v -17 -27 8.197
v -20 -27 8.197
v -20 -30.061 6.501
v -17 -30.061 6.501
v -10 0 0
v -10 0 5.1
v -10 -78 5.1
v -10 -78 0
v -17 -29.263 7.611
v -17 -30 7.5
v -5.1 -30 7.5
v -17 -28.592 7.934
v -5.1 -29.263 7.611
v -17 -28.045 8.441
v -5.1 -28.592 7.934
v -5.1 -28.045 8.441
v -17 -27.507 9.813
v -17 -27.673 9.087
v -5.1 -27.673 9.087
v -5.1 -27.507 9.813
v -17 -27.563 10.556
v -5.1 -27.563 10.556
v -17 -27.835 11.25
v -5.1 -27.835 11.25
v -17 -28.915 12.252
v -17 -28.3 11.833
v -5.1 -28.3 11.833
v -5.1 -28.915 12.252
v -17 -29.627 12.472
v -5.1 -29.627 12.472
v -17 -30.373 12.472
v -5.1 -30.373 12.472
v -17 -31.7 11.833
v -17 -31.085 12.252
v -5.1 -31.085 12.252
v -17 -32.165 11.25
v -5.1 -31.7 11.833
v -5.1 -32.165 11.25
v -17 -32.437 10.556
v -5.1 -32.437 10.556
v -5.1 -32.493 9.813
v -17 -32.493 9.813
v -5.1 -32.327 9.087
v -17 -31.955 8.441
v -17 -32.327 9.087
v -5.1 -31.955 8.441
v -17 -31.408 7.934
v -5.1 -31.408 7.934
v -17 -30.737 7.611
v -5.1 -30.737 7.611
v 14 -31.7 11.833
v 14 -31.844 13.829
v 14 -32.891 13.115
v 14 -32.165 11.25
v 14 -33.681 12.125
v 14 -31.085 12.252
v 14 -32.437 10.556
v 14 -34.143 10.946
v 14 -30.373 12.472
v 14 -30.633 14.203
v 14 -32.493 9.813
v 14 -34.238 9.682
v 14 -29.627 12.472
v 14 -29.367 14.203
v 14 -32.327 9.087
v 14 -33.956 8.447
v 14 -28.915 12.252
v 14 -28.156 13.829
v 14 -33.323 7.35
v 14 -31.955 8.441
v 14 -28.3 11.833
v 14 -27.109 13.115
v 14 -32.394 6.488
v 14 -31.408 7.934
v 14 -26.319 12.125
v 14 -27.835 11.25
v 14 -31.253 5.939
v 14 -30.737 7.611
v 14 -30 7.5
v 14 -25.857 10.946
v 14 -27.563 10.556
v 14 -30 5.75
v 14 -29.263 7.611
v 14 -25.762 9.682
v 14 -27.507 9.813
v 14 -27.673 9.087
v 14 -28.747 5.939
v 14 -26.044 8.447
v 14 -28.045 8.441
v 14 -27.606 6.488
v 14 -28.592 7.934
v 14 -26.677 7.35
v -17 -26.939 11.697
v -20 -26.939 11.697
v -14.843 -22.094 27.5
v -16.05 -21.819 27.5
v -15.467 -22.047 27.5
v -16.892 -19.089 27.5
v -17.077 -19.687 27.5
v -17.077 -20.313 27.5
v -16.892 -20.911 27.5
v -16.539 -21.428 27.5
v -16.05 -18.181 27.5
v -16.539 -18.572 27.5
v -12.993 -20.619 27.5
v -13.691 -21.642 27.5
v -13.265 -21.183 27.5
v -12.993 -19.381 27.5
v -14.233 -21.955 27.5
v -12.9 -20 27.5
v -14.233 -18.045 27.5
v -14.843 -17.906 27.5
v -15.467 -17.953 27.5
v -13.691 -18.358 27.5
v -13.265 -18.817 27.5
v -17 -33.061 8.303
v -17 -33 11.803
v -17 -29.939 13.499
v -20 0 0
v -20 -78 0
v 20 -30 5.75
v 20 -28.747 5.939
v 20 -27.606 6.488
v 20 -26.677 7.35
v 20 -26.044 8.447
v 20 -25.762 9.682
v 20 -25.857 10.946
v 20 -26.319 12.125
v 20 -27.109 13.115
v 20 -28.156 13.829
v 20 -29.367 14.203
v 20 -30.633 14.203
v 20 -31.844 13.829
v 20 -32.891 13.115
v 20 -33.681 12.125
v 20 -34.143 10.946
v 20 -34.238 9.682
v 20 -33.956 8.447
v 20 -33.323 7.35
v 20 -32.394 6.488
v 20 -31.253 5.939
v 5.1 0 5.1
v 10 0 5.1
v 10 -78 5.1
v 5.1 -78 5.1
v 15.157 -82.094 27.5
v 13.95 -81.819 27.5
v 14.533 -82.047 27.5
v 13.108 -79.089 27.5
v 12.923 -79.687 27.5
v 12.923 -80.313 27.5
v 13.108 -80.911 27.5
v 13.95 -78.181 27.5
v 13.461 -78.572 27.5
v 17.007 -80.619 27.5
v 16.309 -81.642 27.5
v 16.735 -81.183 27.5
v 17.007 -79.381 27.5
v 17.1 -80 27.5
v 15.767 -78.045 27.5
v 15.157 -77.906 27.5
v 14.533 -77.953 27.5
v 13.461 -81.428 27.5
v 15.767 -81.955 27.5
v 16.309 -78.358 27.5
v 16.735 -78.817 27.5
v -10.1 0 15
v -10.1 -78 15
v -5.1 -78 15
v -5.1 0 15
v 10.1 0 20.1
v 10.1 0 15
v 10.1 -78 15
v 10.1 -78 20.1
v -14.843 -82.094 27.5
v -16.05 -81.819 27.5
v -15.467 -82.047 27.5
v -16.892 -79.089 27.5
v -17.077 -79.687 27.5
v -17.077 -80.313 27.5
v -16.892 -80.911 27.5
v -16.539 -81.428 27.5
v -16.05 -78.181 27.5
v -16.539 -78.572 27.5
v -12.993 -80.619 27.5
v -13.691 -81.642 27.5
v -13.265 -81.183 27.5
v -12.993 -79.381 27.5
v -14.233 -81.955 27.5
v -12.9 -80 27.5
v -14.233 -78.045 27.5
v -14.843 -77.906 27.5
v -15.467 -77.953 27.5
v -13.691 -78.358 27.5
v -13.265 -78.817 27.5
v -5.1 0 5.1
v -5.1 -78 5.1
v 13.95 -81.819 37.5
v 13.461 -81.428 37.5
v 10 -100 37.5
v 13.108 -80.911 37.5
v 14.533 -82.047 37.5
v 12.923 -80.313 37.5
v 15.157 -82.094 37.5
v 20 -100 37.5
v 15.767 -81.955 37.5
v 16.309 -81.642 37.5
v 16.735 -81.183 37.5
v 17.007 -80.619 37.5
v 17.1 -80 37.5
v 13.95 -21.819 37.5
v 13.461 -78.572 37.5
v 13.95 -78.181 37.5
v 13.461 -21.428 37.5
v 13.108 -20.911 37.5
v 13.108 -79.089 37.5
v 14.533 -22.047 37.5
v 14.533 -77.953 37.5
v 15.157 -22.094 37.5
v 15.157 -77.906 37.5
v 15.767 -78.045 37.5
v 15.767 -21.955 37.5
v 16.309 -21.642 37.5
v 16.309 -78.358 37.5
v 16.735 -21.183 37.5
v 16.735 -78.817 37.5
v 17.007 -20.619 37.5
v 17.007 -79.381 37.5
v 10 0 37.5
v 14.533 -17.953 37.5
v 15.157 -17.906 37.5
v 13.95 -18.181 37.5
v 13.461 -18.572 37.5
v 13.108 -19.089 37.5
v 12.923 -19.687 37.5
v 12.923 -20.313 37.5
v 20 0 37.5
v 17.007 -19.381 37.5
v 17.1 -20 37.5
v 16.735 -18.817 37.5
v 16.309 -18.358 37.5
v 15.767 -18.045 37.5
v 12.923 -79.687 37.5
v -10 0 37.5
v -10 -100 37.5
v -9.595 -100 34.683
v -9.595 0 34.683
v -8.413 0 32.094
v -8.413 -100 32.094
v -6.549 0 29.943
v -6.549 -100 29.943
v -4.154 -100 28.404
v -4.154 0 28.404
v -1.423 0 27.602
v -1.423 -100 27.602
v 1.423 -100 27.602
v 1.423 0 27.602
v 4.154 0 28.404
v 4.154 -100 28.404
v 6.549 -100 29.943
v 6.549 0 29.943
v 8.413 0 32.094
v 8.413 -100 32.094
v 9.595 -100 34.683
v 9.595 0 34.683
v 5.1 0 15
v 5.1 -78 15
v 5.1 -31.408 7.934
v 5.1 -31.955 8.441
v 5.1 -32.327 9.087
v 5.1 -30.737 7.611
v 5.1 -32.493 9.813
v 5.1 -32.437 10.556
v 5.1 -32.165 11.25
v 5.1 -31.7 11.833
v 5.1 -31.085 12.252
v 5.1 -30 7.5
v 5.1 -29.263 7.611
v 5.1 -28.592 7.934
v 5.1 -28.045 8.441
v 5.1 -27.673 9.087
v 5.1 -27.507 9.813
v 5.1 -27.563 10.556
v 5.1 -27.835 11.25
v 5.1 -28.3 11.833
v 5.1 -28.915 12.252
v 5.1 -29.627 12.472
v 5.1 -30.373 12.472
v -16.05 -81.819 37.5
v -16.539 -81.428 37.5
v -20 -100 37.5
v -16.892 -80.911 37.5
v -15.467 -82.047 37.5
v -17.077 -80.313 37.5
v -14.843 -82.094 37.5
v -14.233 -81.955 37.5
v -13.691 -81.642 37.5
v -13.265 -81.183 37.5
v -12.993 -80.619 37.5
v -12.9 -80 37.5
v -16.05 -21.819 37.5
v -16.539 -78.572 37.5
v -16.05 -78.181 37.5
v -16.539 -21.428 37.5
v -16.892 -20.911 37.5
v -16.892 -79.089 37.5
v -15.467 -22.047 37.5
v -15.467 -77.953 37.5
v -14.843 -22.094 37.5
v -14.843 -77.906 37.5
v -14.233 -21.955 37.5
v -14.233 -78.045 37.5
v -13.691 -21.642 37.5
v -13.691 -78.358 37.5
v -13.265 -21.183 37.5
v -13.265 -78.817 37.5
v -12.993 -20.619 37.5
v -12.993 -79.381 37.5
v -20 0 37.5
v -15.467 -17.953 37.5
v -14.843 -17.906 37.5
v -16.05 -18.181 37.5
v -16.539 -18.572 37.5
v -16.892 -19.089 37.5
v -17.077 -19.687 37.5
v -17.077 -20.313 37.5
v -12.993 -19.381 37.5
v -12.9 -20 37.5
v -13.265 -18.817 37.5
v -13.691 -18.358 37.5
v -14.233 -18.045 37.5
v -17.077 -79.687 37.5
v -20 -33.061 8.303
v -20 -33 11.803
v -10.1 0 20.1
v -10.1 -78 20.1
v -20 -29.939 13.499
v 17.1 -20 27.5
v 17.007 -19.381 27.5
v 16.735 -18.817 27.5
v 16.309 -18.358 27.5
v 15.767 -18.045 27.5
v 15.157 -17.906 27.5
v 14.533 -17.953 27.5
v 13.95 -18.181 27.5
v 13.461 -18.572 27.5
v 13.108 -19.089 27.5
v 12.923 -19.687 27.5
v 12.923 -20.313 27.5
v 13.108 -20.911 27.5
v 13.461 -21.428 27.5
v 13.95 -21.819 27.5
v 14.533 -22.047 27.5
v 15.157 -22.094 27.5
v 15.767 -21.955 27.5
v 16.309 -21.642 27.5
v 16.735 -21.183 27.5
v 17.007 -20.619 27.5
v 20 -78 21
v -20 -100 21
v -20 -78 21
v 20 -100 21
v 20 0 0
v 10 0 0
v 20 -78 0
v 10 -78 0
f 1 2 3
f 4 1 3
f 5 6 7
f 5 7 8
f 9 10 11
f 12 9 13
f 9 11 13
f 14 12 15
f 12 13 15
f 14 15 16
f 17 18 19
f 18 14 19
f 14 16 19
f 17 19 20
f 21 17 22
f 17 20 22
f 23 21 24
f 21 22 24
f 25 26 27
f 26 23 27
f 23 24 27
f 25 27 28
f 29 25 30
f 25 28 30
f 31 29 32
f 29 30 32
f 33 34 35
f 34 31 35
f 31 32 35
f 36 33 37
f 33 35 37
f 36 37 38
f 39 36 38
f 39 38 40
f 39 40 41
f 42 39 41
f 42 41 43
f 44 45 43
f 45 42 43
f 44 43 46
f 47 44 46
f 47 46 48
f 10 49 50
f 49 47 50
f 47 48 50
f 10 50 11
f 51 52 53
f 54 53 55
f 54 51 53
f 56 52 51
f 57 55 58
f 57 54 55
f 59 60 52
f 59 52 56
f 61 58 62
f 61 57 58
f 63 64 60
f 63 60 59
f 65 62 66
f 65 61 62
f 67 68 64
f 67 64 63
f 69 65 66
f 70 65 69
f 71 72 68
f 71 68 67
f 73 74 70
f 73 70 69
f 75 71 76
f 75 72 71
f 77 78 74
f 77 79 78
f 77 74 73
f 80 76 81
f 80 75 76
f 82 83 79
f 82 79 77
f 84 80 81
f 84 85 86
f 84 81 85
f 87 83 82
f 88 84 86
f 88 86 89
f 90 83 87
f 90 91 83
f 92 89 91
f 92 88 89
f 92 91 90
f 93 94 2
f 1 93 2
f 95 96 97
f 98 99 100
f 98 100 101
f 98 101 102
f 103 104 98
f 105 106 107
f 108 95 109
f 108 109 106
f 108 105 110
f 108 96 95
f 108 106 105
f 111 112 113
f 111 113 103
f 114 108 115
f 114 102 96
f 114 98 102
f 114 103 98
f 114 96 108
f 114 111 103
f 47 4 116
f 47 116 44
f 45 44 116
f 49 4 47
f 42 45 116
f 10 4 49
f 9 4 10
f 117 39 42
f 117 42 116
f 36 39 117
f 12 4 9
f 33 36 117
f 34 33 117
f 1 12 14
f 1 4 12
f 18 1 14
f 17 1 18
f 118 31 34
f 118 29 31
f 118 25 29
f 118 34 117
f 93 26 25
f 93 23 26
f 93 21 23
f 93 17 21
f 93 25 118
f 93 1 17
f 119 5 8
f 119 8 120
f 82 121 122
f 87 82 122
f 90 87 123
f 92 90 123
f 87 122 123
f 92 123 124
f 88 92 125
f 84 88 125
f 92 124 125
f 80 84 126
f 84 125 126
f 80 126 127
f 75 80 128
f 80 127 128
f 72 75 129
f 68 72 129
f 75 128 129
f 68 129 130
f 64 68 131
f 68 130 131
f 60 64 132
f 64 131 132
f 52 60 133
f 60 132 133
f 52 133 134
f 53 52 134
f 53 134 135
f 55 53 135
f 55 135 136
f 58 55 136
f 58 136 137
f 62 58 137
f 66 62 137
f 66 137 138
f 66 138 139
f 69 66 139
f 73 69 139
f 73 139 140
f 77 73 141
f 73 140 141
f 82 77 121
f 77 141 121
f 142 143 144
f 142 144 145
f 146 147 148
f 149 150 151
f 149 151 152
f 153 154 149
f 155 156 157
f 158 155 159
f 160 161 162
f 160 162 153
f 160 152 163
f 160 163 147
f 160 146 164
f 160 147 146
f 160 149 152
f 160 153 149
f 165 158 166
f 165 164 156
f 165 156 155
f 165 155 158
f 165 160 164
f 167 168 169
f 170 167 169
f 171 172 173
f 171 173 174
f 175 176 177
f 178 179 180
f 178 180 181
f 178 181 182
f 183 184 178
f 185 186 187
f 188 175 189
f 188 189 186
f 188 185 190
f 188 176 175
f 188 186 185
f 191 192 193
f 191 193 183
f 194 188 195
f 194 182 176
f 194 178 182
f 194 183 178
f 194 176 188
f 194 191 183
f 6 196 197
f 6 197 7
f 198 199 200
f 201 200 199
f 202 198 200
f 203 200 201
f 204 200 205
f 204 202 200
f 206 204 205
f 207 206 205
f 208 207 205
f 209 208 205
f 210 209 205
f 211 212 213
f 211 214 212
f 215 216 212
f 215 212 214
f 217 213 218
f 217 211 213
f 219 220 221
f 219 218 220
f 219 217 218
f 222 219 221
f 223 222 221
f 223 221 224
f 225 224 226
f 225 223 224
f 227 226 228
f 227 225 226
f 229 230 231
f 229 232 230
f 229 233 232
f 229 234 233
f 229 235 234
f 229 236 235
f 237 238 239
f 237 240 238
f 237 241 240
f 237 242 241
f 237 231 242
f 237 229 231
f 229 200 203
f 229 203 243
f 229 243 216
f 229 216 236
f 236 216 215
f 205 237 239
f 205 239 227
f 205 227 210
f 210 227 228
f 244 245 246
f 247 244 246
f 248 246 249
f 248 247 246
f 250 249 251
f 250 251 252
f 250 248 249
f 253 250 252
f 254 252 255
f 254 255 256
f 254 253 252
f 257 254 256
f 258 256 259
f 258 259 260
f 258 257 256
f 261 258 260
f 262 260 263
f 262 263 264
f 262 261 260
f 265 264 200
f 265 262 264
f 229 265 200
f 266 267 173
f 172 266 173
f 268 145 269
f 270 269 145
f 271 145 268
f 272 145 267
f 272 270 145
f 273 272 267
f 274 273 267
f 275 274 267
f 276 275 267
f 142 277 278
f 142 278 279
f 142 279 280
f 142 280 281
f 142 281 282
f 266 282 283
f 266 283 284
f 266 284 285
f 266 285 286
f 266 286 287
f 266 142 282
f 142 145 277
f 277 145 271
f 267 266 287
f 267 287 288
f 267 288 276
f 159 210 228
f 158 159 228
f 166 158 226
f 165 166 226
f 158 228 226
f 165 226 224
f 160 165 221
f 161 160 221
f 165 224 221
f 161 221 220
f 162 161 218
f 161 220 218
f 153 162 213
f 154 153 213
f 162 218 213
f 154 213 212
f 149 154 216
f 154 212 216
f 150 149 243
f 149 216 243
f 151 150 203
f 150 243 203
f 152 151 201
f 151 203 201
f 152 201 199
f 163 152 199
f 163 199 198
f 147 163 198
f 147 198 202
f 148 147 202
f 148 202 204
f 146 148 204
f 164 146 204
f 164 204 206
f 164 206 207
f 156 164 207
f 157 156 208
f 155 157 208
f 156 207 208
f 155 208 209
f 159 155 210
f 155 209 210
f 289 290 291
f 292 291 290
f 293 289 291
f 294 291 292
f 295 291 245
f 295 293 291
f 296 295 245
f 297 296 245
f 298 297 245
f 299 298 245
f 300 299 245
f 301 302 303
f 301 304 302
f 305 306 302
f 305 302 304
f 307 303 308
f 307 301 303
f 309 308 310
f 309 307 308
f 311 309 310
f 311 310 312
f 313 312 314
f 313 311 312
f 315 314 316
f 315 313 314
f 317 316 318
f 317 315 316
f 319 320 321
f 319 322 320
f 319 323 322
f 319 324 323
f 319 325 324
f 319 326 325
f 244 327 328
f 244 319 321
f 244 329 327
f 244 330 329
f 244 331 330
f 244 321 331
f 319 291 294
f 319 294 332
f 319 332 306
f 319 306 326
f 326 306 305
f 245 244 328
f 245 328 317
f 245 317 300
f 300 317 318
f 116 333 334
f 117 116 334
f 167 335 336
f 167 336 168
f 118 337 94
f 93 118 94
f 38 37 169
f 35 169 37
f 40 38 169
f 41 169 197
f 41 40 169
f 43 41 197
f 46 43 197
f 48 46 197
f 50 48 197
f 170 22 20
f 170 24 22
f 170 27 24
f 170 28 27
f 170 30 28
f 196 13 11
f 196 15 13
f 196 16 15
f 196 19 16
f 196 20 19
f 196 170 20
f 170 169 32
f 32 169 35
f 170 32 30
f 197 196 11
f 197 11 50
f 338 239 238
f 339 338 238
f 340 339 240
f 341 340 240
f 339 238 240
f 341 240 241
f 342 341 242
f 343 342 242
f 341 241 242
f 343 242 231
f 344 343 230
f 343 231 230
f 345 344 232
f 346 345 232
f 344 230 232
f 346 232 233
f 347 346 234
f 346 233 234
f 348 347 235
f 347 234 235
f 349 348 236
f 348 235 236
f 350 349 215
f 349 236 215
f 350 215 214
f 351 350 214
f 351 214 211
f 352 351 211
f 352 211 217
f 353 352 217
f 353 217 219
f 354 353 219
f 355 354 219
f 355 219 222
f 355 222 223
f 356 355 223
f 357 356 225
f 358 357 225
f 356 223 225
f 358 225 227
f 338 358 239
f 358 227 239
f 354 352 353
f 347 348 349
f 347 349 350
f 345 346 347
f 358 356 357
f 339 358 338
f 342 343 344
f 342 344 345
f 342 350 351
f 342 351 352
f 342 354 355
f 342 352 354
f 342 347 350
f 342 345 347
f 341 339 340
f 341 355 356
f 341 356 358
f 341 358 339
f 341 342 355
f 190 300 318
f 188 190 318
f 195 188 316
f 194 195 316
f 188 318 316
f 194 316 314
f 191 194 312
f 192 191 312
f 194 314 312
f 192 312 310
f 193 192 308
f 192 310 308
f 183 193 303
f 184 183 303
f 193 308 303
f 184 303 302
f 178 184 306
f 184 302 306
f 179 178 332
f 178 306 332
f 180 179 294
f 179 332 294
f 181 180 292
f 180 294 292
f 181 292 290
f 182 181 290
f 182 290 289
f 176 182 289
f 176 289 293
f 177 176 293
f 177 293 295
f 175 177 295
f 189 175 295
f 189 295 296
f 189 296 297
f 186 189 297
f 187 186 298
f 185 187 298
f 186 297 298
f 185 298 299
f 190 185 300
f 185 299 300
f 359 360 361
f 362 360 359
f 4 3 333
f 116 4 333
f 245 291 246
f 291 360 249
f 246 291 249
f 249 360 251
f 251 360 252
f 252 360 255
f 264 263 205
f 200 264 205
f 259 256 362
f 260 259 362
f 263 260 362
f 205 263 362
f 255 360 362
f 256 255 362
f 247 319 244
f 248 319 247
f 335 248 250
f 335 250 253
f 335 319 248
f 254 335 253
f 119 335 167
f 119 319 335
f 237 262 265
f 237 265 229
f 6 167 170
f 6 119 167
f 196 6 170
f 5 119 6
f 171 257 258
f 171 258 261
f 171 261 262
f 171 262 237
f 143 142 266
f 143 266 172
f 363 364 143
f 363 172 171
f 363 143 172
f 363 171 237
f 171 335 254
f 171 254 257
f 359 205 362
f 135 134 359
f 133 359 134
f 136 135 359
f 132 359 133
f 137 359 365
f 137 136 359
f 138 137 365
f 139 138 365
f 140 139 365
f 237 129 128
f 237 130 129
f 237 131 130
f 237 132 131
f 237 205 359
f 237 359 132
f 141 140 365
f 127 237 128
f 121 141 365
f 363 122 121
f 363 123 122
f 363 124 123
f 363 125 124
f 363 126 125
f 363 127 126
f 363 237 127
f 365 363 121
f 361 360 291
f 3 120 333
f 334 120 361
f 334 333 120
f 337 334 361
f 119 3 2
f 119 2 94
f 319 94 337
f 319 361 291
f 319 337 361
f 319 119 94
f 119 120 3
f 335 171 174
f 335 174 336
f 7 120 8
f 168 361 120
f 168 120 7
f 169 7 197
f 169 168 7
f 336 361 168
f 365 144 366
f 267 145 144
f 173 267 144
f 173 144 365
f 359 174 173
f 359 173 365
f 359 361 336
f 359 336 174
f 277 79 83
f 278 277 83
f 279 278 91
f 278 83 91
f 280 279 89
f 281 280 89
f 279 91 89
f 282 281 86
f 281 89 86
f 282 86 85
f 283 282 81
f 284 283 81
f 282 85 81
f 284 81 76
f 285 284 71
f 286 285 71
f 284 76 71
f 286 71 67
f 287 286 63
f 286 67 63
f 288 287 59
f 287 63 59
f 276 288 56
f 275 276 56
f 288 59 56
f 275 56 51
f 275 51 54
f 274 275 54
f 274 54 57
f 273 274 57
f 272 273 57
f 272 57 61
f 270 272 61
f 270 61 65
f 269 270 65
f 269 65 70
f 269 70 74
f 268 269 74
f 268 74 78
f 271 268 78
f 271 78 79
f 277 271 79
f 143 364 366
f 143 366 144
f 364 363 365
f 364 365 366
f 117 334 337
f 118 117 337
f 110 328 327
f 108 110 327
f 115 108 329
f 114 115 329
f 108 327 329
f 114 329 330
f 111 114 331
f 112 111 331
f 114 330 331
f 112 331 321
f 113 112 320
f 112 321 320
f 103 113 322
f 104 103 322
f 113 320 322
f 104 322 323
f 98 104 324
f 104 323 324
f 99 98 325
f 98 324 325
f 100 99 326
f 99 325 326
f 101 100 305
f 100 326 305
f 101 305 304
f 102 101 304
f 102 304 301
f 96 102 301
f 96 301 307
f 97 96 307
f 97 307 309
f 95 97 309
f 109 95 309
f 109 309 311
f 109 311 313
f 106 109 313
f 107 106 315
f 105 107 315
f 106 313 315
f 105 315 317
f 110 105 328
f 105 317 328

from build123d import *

# Parameters (mm, degrees)
BOSS_EXTRUDE1_DEPTH = 100
SKETCH5_W           = 40
SKETCH5_H           = 21
CUT_EXTRUDE5_DEPTH  = 22
SKETCH3_3_R         = 2.5
CUT_EXTRUDE3_DEPTH  = 115.04494728
SKETCH3_R           = 4.25
SKETCH3_R_2         = 2.5
CUT_EXTRUDE4_DEPTH  = 6
SKETCH7_R           = 2.1
CUT_EXTRUDE7_DEPTH  = 10
CUT_EXTRUDE8_START  = -3
SKETCH10_R          = 2.5
CUT_EXTRUDE8_DEPTH  = 3


with BuildPart() as part:
    # Sketch1 → Boss-Extrude1 (new body)
    with BuildSketch(Plane(origin=(0, 0, 0), x_dir=(1, 0, 0), z_dir=(0, 1, 0))):
        with BuildLine():
            Line((-10, -5.1), (-10, 0))
            Line((-10, 0), (-20, 0))
            Line((-20, 0), (-20, -37.5))
            Line((-20, -37.5), (-10, -37.5))
            ThreePointArc((-10, -37.5), (0, -27.5), (10, -37.5))
            Line((10, -37.5), (20, -37.5))
            Line((20, -37.5), (20, 0))
            Line((20, 0), (10, 0))
            Line((10, 0), (10, -5.1))
            Line((10, -5.1), (5.1, -5.1))
            Line((5.1, -5.1), (5.1, -15))
            Line((5.1, -15), (10.1, -15))
            Line((10.1, -15), (10.1, -20.1))
            Line((10.1, -20.1), (-10.1, -20.1))
            Line((-10.1, -20.1), (-10.1, -15))
            Line((-10.1, -15), (-5.1, -15))
            Line((-5.1, -15), (-5.1, -5.1))
            Line((-5.1, -5.1), (-10, -5.1))
        make_face()
    extrude(amount=-BOSS_EXTRUDE1_DEPTH)

    # Sketch5 → Cut-Extrude5 (cut)
    with BuildSketch(Plane.XZ.offset(100)):
        with Locations((0, 10.5)):
            Rectangle(SKETCH5_W, SKETCH5_H)
    extrude(amount=-CUT_EXTRUDE5_DEPTH, mode=Mode.SUBTRACT)

    # Sketch3<3> → Cut-Extrude3 (cut, through all)
    with BuildSketch(Plane(origin=(20, 0, 0), x_dir=(0, 0, -1), z_dir=(1, 0, 0))):
        with Locations((-10, -30)):
            Circle(SKETCH3_3_R)
    extrude(amount=-CUT_EXTRUDE3_DEPTH, mode=Mode.SUBTRACT)

    # Sketch3 → Cut-Extrude4 (cut)
    with BuildSketch(Plane(origin=(20, 0, 0), x_dir=(0, 0, -1), z_dir=(1, 0, 0))):
        with Locations((-10, -30)):
            Circle(SKETCH3_R)
        with Locations((-10, -30)):
            Circle(SKETCH3_R_2, mode=Mode.SUBTRACT)
    extrude(amount=-CUT_EXTRUDE4_DEPTH, mode=Mode.SUBTRACT)

    # Sketch7 → Cut-Extrude7 (cut)
    with BuildSketch(Plane.XY.offset(37.5)):
        with Locations((-15, -80)):
            Circle(SKETCH7_R)
        with Locations((15, -80)):
            Circle(SKETCH7_R)
        with Locations((-15, -20)):
            Circle(SKETCH7_R)
        with Locations((15, -20)):
            Circle(SKETCH7_R)
    extrude(amount=-CUT_EXTRUDE7_DEPTH, mode=Mode.SUBTRACT)

    # Sketch10 → Cut-Extrude8 (cut)
    with BuildSketch(Plane.ZY.offset(20).offset(CUT_EXTRUDE8_START)):
        Polygon((13.49946403, -29.9387505), (11.696688392, -26.9387505), (8.197224362, -27), (6.50053597, -30.0612495), (8.303311608, -33.0612495), (11.802775638, -33), align=None)
        with Locations((10, -30)):
            Circle(SKETCH10_R, mode=Mode.SUBTRACT)
    extrude(amount=CUT_EXTRUDE8_DEPTH, mode=Mode.SUBTRACT)


solid = part.part
